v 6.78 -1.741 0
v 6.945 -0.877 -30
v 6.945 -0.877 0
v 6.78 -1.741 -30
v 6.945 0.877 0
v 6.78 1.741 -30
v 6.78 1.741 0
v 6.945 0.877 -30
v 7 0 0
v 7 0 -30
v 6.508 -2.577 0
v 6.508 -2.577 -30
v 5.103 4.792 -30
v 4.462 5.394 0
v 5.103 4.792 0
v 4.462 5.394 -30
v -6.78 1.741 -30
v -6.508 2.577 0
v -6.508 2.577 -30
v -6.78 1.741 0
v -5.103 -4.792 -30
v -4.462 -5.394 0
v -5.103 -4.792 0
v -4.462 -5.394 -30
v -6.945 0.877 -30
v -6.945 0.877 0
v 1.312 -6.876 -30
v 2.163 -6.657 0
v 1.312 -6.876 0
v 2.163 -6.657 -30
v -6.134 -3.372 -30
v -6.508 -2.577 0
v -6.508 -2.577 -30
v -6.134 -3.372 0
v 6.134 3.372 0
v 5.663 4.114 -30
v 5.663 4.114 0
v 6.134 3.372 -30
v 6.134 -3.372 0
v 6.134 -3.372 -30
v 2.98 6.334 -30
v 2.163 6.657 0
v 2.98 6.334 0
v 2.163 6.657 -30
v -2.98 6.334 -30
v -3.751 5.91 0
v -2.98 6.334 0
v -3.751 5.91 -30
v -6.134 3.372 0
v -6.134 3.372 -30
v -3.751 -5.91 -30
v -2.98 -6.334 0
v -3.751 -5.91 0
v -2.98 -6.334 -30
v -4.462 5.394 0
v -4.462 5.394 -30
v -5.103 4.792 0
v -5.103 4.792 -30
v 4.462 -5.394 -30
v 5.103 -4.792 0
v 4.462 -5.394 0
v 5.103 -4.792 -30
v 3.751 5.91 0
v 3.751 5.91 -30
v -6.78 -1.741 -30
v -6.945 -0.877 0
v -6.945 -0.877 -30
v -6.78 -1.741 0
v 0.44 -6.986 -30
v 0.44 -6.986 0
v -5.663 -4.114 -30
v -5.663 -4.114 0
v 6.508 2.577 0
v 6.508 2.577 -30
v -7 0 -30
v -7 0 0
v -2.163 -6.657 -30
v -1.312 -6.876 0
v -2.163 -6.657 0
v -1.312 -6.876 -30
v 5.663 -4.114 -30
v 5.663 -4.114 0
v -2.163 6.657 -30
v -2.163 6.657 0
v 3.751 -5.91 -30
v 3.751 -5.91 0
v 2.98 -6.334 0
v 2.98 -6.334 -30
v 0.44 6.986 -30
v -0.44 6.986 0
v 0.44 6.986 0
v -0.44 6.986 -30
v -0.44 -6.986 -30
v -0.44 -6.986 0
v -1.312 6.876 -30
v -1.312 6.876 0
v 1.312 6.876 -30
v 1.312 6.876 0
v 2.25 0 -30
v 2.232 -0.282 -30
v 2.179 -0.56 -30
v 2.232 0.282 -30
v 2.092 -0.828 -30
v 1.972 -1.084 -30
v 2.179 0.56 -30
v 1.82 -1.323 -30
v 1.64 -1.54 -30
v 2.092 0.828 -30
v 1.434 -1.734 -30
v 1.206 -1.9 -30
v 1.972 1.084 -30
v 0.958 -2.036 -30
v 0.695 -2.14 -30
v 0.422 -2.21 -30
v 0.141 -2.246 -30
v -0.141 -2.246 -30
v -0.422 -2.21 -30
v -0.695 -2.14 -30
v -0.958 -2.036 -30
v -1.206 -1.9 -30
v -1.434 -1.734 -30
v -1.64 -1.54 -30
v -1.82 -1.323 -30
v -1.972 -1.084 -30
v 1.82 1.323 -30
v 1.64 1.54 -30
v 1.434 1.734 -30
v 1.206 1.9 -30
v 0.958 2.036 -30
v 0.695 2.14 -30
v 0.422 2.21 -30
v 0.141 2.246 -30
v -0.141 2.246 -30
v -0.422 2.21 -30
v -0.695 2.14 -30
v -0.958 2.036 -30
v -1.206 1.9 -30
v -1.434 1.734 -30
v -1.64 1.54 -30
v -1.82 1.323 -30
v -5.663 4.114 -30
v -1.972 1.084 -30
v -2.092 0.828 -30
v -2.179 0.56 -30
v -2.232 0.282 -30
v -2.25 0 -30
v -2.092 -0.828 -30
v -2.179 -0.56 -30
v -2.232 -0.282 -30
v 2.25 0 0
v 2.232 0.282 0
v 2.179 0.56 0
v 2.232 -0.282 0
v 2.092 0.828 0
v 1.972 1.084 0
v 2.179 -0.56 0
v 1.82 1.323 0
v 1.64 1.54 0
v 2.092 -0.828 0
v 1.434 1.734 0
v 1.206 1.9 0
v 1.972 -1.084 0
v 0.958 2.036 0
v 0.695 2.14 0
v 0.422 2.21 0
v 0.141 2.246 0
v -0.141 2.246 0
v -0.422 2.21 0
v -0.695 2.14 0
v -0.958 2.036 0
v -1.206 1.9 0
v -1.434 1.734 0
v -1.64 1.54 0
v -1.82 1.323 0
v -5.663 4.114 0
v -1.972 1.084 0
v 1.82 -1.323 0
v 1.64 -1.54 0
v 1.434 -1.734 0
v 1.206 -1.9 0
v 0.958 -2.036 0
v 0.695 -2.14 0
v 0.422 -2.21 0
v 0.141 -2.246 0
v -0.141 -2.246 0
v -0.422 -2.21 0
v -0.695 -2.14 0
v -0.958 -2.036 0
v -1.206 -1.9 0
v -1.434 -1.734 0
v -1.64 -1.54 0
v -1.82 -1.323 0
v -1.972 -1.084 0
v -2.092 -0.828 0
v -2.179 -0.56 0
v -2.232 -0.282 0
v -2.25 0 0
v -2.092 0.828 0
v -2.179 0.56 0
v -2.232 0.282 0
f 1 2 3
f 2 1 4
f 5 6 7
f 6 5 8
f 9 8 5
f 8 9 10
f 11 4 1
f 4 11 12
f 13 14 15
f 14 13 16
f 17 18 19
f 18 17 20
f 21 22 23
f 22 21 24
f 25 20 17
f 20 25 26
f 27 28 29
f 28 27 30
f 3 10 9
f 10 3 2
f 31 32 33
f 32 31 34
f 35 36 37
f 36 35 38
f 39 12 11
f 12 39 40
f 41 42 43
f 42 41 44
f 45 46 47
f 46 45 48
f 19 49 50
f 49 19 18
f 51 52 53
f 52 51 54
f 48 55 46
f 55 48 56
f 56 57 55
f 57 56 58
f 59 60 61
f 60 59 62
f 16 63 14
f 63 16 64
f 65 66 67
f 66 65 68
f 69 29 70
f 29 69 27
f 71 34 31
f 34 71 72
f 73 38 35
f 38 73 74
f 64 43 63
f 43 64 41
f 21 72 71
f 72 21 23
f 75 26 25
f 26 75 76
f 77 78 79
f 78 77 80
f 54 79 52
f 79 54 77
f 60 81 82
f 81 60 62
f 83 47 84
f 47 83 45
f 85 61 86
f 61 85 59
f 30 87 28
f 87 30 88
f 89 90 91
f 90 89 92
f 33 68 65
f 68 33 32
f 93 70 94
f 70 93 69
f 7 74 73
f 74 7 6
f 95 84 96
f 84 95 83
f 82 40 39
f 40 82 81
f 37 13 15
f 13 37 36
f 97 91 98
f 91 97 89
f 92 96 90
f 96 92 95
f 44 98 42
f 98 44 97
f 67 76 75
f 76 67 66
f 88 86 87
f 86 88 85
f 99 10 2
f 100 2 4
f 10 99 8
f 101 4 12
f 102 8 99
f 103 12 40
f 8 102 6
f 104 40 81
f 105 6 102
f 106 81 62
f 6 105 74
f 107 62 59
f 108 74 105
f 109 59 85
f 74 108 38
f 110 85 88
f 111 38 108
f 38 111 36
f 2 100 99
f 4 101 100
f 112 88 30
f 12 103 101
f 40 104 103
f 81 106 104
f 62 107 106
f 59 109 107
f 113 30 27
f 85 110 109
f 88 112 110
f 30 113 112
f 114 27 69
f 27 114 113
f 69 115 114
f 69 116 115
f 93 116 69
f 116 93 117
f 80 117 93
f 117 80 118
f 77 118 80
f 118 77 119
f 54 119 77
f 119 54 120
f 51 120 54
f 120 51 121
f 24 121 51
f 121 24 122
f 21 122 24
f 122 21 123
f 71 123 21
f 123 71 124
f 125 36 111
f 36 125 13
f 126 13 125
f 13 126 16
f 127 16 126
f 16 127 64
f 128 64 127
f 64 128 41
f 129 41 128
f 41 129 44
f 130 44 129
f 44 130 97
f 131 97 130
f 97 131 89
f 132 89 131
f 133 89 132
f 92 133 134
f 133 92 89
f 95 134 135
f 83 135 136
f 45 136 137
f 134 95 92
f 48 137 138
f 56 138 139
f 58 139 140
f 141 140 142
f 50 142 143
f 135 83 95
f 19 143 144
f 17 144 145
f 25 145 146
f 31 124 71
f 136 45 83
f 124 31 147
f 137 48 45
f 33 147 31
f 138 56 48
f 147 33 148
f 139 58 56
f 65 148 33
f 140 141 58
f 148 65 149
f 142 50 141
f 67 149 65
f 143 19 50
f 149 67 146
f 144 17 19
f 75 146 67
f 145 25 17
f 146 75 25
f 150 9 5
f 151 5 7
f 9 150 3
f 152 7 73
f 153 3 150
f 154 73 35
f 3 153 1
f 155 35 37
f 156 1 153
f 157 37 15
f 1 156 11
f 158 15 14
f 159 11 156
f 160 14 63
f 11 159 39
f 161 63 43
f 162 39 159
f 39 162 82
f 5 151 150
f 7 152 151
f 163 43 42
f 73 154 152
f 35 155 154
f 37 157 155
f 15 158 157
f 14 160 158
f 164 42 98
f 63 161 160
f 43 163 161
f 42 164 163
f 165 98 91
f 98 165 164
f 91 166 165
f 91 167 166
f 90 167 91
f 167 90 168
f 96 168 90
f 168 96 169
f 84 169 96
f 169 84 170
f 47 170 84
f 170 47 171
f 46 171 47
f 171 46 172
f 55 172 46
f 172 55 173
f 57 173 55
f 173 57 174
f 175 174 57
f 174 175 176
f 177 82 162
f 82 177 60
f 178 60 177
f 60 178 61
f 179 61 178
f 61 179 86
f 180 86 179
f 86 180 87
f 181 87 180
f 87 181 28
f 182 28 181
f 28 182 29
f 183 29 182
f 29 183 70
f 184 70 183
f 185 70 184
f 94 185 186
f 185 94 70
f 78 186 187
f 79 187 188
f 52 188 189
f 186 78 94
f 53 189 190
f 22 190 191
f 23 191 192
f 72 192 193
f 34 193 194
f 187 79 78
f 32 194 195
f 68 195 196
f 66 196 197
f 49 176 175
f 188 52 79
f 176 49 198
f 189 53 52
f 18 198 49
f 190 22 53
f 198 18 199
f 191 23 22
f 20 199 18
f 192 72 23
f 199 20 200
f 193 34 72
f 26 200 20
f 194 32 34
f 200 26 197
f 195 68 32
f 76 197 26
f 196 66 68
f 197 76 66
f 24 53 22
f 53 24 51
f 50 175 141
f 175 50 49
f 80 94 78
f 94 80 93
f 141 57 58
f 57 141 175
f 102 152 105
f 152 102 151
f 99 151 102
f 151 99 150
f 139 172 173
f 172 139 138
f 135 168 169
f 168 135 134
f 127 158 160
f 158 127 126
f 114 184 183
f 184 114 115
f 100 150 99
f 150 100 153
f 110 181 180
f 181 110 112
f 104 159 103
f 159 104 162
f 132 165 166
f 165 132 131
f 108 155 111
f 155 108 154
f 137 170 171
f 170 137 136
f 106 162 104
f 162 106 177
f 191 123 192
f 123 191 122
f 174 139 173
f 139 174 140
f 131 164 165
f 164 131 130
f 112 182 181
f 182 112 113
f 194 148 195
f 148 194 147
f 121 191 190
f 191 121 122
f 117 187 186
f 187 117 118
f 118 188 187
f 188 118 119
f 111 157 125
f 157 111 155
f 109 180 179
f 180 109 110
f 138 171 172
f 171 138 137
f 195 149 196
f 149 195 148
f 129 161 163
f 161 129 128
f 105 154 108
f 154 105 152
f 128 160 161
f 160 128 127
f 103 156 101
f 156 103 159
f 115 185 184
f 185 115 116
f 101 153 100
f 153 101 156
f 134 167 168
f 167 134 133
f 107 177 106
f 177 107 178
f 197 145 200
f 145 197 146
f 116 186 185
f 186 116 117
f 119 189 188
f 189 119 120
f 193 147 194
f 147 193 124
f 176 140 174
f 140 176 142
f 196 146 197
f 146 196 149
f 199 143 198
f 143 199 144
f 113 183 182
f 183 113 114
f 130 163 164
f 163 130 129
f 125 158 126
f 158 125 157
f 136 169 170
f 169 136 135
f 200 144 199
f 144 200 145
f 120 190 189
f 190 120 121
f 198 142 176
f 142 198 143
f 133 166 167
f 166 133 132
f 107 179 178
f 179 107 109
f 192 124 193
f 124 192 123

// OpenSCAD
$fn = 50;


difference() {
	union() {
		translate(v = [0, 0, -30.0000000000]) {
			cylinder(h = 30, r = 7.0000000000);
		}
		cylinder(h = 0, r = 16.0000000000);
	}
	union() {
		#translate(v = [0, 0, -30]) {
			cylinder(h = 30, r = 2.2500000000);
		}
	}
}
